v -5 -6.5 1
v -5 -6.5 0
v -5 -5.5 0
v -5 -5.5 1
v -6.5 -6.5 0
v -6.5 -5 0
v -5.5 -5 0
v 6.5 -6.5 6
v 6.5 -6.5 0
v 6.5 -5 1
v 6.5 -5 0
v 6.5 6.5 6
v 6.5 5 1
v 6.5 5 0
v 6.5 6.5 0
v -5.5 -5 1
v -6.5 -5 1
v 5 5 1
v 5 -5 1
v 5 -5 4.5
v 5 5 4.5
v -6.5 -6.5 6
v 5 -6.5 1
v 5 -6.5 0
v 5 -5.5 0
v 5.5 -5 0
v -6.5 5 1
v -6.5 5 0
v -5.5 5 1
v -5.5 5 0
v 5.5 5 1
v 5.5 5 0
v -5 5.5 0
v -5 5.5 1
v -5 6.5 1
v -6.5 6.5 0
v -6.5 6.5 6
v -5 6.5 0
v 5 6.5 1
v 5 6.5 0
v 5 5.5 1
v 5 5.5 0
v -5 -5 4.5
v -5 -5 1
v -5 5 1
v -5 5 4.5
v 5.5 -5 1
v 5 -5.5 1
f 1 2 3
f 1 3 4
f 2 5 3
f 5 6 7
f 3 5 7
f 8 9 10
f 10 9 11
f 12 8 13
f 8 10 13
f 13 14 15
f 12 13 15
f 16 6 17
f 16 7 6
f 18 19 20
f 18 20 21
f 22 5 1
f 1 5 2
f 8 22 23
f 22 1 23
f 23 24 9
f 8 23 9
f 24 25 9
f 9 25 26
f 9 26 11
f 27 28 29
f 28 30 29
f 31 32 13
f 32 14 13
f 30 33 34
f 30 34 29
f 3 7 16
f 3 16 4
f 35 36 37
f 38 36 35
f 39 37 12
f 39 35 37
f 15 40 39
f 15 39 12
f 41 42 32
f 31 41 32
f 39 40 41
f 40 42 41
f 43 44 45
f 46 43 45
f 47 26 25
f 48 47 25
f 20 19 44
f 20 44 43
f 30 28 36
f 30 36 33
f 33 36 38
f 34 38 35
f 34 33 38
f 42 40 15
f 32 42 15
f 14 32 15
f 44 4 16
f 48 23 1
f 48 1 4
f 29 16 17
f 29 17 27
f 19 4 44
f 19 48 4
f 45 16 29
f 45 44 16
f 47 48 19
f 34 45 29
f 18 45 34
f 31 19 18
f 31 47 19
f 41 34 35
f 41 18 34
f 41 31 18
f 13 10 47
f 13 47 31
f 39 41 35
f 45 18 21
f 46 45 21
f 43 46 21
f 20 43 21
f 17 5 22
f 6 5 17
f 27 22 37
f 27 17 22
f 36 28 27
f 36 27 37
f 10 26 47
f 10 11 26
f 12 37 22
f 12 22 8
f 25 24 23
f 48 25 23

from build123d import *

# Parameters (mm, degrees)
F0_W        = 13
F0_H        = 13
F1_DEPTH    = 6
F2_W        = 10
F2_H        = 10
F3_DEPTH    = 4.5
F4_W        = 10
F4_H        = 2
F5_DEPTH    = 12.5
F6_W        = 10
F6_H        = 2
F7_DEPTH    = 12.5
F8_T1_DEPTH = 2.285841494


# Not quite as in the source:
# - a fillet or chamfer that OpenCascade refuses, or shapes differently, is made with other operations: its cross-section is extruded or revolved along the edge and cut away or added


with BuildPart() as f1:
    # F0 (on Top) → F1 (new body)
    with BuildSketch(Plane.XY):
        Rectangle(F0_W, F0_H)
    extrude(amount=F1_DEPTH)

    # F2 (on Top) → F3 (cut)
    with BuildSketch(Plane.XY):
        Rectangle(F2_W, F2_H)
    extrude(amount=F3_DEPTH, mode=Mode.SUBTRACT)

    # F4 (on Right) → F5 (cut, symmetric)
    with BuildSketch(Plane.YZ):
        Rectangle(F4_W, F4_H)
    extrude(amount=F5_DEPTH, both=True, mode=Mode.SUBTRACT)

    # F6 (on Front) → F7 (cut, symmetric)
    with BuildSketch(Plane.XZ):
        Rectangle(F6_W, F6_H)
    extrude(amount=F7_DEPTH, both=True, mode=Mode.SUBTRACT)

    # F8: chamfer of 0.5 on 4 edges, made by hand

    # F8_s2 → F8_t1 (cut)
    with BuildSketch(Plane.XY.offset(-1.285841494)):
        Polygon((5.5, -5), (5, -5.5), (5, -5), align=None)
        Polygon((5, 5.5), (5.5, 5), (5, 5), align=None)
        Polygon((-5.5, -5), (-5, -5.5), (-5, -5), align=None)
        Polygon((-5, 5.5), (-5.5, 5), (-5, 5), align=None)
    extrude(amount=F8_T1_DEPTH, mode=Mode.SUBTRACT)


solid = f1.part
